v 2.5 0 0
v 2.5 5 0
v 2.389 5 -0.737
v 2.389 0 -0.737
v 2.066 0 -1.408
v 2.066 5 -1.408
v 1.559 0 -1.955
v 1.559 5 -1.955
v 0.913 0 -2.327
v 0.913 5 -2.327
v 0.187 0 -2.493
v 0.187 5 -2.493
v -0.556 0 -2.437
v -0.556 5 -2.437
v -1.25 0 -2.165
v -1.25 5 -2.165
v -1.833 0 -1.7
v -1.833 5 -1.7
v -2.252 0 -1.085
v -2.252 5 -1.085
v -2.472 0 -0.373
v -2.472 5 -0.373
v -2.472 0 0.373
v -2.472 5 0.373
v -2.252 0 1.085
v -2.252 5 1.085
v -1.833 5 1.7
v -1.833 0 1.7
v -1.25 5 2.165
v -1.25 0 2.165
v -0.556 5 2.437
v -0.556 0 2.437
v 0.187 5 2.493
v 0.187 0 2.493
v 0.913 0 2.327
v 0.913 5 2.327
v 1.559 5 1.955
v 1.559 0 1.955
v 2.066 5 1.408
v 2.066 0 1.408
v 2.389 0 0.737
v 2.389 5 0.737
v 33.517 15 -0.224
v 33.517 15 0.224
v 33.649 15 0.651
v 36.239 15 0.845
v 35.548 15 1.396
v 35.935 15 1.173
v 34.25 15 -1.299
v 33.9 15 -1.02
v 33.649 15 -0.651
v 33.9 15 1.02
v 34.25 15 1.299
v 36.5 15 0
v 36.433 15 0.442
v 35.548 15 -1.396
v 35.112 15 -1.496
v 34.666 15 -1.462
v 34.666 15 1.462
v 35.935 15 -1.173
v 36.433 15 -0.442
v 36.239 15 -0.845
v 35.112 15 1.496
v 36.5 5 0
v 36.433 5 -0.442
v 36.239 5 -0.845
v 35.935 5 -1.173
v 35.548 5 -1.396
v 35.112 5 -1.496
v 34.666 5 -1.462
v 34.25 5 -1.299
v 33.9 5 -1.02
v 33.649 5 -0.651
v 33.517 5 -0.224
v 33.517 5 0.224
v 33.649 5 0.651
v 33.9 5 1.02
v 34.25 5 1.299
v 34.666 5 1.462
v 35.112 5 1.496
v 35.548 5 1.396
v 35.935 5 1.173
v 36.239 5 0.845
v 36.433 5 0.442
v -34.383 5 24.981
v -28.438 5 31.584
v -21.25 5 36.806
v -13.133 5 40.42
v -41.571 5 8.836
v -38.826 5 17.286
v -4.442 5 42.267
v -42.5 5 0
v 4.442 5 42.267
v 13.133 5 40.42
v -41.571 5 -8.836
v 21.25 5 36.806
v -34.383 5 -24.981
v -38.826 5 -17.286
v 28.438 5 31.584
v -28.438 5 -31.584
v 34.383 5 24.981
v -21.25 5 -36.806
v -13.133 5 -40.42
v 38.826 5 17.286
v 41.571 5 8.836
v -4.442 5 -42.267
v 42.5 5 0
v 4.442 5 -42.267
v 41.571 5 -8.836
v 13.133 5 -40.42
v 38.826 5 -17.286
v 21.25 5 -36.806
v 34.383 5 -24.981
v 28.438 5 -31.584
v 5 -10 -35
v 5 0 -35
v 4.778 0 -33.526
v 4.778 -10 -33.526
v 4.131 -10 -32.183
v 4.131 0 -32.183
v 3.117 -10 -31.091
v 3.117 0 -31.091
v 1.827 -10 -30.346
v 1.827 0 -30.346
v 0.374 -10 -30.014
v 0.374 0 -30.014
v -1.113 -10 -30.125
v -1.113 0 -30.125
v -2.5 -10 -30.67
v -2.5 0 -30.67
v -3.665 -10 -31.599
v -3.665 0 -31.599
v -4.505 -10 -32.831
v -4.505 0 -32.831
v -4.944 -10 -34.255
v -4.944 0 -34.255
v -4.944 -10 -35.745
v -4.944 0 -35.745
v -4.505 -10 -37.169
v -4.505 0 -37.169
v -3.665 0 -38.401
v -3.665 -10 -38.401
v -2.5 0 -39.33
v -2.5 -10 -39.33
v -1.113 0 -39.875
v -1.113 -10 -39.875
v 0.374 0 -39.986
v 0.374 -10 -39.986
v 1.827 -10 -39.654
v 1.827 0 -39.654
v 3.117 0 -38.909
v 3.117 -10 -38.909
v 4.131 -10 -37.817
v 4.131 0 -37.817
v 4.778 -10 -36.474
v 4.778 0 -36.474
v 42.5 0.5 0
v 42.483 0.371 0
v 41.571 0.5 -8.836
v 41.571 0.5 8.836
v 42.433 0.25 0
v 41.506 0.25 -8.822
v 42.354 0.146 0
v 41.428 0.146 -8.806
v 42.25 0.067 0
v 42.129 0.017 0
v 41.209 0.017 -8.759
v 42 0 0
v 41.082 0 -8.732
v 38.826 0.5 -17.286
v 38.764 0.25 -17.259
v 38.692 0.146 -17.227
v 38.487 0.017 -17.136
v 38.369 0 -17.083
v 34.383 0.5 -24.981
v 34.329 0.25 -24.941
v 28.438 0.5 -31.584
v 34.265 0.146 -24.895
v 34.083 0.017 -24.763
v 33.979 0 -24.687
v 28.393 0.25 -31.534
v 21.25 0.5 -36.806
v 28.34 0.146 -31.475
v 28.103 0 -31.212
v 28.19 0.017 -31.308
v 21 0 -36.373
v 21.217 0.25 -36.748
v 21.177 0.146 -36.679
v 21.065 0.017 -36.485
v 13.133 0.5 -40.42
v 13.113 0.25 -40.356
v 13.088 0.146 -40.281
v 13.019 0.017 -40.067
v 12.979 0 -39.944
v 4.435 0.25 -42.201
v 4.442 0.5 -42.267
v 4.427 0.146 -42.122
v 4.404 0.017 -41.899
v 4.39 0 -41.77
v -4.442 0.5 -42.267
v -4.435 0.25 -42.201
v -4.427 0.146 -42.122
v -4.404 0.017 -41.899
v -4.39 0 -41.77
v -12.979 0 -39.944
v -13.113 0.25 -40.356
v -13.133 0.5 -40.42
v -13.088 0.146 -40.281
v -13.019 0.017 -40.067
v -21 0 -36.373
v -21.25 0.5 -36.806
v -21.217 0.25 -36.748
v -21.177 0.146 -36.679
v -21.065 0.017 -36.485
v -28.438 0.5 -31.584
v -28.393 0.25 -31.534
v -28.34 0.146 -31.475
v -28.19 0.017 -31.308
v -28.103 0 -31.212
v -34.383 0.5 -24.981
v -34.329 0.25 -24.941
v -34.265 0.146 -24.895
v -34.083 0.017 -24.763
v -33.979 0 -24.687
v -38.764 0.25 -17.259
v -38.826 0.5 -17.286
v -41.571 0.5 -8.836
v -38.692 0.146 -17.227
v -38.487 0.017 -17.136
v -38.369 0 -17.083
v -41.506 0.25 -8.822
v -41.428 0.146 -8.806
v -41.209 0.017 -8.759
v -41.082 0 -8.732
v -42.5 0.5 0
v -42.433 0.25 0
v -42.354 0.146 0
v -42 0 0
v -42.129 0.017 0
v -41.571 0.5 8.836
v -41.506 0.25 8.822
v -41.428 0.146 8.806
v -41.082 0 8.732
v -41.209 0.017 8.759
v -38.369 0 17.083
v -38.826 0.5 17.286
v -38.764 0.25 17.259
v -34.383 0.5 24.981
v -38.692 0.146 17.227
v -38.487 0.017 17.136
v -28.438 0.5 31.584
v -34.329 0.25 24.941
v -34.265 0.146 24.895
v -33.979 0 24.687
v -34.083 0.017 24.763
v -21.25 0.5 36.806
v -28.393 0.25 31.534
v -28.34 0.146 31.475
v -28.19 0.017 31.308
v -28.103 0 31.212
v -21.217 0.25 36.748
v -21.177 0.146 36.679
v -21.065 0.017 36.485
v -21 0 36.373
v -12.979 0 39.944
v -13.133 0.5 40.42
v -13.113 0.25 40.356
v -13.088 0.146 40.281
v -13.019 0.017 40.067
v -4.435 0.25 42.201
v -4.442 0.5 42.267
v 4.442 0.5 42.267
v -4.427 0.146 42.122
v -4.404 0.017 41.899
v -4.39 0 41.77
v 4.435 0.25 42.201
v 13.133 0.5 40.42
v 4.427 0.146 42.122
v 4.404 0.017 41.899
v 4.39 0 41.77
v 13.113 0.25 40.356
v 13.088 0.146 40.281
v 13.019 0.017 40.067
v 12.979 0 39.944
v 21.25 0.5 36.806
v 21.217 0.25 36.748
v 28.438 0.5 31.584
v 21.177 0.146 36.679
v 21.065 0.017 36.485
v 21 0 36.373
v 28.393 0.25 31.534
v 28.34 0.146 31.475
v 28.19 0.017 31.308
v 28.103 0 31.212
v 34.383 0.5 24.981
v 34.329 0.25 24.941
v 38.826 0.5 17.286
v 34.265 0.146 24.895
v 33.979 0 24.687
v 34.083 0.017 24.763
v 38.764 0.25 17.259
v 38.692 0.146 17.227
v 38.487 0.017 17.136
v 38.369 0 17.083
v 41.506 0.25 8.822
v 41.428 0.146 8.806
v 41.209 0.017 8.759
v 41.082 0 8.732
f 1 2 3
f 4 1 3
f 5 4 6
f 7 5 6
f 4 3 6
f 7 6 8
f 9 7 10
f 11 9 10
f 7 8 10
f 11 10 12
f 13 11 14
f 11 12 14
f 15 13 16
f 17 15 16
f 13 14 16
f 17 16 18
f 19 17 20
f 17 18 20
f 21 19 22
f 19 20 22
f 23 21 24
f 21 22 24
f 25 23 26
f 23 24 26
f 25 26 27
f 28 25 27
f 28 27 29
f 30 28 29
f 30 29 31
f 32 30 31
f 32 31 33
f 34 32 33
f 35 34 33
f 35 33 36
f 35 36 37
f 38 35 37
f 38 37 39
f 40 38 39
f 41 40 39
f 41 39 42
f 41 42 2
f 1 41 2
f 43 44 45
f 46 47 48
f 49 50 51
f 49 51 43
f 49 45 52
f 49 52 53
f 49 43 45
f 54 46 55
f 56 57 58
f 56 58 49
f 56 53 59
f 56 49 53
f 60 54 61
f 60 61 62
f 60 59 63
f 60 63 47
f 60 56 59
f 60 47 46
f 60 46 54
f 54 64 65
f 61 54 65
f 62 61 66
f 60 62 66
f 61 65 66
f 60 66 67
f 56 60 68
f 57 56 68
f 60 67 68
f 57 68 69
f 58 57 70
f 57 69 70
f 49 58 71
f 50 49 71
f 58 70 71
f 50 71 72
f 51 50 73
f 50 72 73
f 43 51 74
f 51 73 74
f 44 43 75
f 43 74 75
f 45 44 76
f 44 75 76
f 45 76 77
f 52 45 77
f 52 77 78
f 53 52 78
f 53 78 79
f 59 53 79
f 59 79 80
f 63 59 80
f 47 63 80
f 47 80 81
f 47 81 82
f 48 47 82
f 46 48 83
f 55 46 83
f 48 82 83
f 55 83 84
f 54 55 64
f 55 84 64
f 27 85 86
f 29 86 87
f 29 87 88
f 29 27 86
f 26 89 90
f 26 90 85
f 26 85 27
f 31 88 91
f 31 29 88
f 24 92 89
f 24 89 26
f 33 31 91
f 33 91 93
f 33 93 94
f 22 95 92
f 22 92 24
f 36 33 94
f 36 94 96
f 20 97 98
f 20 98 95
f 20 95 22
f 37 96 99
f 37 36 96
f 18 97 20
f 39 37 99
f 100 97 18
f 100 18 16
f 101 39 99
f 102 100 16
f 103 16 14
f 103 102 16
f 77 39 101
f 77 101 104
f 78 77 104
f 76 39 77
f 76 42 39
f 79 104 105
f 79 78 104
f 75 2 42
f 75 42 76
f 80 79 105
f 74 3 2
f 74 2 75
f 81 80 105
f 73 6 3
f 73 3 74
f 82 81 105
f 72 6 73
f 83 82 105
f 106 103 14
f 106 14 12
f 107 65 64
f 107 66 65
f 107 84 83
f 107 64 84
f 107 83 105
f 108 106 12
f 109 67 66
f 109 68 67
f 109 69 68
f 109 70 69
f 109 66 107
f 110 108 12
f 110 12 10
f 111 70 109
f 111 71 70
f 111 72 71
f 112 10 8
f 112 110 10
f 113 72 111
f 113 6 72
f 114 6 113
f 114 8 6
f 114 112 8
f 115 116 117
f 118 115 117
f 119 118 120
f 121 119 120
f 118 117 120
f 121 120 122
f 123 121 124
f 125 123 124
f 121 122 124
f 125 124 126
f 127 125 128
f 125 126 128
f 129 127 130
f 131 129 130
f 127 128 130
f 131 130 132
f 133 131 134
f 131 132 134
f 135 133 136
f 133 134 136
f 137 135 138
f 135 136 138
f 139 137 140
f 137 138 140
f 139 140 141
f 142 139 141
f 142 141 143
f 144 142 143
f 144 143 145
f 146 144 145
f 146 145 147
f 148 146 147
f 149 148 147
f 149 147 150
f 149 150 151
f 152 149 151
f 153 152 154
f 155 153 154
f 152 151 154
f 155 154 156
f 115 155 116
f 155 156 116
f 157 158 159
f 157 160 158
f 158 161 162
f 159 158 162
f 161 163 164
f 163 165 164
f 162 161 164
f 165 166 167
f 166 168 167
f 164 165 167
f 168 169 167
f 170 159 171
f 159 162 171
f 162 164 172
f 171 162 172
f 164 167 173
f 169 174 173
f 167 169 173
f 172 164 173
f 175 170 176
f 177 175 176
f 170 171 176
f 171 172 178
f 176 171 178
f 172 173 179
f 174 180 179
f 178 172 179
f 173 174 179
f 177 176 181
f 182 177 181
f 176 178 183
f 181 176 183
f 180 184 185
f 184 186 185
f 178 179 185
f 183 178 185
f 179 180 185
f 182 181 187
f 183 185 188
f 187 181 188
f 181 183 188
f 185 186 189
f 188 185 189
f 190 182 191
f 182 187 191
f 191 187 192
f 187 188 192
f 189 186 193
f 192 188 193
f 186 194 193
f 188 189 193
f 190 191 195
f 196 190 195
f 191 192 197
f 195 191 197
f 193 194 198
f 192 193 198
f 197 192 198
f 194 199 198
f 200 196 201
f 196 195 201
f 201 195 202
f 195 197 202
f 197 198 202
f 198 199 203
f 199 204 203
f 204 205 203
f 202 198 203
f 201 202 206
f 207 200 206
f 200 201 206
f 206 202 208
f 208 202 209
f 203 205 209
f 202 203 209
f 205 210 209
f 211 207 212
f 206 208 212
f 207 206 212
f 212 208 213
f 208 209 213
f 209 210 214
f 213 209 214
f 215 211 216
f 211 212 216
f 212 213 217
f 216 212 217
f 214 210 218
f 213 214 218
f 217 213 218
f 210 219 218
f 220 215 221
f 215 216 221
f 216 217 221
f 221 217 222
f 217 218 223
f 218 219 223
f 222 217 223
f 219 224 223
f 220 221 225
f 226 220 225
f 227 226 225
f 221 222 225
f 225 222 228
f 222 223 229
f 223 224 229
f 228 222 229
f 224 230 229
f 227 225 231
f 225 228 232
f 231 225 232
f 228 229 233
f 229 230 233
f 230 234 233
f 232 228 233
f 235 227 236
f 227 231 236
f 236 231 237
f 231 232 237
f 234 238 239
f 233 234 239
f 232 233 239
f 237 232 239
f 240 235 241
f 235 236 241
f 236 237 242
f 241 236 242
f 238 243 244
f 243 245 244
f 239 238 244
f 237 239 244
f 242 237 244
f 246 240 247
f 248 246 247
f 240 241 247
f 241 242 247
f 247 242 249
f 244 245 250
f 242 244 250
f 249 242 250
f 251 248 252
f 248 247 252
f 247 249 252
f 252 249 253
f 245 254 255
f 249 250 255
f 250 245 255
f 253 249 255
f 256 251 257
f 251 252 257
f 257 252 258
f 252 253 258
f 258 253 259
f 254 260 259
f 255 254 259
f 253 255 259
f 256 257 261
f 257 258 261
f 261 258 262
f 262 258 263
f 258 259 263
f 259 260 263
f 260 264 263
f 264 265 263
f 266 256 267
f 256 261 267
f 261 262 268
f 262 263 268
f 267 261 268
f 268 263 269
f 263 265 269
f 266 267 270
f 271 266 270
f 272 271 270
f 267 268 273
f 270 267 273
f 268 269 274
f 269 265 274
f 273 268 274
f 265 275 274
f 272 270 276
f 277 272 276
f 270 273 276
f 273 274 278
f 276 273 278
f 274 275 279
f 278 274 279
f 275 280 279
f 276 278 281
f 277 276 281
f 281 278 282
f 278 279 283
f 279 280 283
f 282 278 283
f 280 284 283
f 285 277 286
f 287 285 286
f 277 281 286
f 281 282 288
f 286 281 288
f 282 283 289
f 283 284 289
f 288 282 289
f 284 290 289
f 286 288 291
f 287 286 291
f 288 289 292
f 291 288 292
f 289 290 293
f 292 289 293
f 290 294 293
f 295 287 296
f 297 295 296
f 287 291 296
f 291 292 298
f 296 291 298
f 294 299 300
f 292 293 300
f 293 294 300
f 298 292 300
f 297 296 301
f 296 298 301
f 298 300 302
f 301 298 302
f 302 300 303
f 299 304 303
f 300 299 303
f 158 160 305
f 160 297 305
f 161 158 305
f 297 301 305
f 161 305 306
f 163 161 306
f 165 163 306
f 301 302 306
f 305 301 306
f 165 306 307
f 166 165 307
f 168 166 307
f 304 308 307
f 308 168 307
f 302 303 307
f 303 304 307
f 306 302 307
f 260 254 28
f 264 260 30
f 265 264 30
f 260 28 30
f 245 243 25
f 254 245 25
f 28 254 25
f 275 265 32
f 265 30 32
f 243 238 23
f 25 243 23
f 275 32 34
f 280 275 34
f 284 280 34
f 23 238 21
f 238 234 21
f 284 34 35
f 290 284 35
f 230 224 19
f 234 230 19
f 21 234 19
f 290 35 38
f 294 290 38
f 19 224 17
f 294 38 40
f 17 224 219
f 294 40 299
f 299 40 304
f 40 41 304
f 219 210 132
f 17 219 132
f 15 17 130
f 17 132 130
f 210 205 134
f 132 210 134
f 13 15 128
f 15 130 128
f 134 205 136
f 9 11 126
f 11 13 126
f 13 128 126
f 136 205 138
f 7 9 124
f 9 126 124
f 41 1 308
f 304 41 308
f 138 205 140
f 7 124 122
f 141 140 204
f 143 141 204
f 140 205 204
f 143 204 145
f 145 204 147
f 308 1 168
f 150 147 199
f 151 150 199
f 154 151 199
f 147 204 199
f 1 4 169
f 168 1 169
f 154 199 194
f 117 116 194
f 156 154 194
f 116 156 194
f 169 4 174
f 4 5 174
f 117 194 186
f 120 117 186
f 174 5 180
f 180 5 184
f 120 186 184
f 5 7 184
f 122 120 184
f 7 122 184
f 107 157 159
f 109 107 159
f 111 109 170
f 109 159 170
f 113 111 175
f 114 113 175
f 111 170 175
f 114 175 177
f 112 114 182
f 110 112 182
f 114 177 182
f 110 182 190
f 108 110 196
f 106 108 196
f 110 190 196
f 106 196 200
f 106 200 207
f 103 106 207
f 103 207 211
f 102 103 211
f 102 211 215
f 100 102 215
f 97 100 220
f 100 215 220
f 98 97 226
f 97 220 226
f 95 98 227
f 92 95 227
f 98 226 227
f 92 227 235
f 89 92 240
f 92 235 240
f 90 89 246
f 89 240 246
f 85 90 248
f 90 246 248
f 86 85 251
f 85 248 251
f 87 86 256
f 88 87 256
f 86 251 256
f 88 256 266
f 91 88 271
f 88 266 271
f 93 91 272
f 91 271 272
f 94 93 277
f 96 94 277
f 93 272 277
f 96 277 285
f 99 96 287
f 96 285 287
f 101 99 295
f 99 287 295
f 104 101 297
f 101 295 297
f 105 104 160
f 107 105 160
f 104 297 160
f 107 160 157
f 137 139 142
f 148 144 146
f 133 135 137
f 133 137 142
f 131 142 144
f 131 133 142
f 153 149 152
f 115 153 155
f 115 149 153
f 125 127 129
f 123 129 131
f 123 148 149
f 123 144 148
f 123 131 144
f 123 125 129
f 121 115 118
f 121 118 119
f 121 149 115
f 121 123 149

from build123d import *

# Parameters (mm, degrees)
SKETCH1_R           = 42.5
BOSS_EXTRUDE1_DEPTH = 5
SKETCH2_R           = 1.5
BOSS_EXTRUDE2_DEPTH = 10
SKETCH3_R           = 2.5
CUT_EXTRUDE1_DEPTH  = 10
SKETCH4_R           = 5
BOSS_EXTRUDE3_DEPTH = 10
FILLET1_R           = 0.5


with BuildPart() as part:
    # Sketch1 → Boss-Extrude1 (new body)
    with BuildSketch(Plane(origin=(0, 0, 0), x_dir=(1, 0, 0), z_dir=(0, 1, 0))):
        Circle(SKETCH1_R)
    extrude(amount=BOSS_EXTRUDE1_DEPTH)

    # Sketch2 → Boss-Extrude2 (add)
    with BuildSketch(Plane(origin=(0, 5, 0), x_dir=(1, 0, 0), z_dir=(0, 1, 0))):
        with Locations((35, 0)):
            Circle(SKETCH2_R)
    extrude(amount=BOSS_EXTRUDE2_DEPTH)

    # Sketch3 → Cut-Extrude1 (cut)
    with BuildSketch(Plane(origin=(0, 5, 0), x_dir=(1, 0, 0), z_dir=(0, 1, 0))):
        Circle(SKETCH3_R)
    extrude(amount=-CUT_EXTRUDE1_DEPTH, mode=Mode.SUBTRACT)

    # Sketch4 → Boss-Extrude3 (add)
    with BuildSketch(Plane.XZ):
        with Locations((0, -35)):
            Circle(SKETCH4_R)
    extrude(amount=BOSS_EXTRUDE3_DEPTH)

    # Fillet1
    fillet1_edges = [part.edges().sort_by_distance(p)[0] for p in [
        (-42.5, 0, 0),
    ]]
    fillet(fillet1_edges, radius=FILLET1_R)


solid = part.part
